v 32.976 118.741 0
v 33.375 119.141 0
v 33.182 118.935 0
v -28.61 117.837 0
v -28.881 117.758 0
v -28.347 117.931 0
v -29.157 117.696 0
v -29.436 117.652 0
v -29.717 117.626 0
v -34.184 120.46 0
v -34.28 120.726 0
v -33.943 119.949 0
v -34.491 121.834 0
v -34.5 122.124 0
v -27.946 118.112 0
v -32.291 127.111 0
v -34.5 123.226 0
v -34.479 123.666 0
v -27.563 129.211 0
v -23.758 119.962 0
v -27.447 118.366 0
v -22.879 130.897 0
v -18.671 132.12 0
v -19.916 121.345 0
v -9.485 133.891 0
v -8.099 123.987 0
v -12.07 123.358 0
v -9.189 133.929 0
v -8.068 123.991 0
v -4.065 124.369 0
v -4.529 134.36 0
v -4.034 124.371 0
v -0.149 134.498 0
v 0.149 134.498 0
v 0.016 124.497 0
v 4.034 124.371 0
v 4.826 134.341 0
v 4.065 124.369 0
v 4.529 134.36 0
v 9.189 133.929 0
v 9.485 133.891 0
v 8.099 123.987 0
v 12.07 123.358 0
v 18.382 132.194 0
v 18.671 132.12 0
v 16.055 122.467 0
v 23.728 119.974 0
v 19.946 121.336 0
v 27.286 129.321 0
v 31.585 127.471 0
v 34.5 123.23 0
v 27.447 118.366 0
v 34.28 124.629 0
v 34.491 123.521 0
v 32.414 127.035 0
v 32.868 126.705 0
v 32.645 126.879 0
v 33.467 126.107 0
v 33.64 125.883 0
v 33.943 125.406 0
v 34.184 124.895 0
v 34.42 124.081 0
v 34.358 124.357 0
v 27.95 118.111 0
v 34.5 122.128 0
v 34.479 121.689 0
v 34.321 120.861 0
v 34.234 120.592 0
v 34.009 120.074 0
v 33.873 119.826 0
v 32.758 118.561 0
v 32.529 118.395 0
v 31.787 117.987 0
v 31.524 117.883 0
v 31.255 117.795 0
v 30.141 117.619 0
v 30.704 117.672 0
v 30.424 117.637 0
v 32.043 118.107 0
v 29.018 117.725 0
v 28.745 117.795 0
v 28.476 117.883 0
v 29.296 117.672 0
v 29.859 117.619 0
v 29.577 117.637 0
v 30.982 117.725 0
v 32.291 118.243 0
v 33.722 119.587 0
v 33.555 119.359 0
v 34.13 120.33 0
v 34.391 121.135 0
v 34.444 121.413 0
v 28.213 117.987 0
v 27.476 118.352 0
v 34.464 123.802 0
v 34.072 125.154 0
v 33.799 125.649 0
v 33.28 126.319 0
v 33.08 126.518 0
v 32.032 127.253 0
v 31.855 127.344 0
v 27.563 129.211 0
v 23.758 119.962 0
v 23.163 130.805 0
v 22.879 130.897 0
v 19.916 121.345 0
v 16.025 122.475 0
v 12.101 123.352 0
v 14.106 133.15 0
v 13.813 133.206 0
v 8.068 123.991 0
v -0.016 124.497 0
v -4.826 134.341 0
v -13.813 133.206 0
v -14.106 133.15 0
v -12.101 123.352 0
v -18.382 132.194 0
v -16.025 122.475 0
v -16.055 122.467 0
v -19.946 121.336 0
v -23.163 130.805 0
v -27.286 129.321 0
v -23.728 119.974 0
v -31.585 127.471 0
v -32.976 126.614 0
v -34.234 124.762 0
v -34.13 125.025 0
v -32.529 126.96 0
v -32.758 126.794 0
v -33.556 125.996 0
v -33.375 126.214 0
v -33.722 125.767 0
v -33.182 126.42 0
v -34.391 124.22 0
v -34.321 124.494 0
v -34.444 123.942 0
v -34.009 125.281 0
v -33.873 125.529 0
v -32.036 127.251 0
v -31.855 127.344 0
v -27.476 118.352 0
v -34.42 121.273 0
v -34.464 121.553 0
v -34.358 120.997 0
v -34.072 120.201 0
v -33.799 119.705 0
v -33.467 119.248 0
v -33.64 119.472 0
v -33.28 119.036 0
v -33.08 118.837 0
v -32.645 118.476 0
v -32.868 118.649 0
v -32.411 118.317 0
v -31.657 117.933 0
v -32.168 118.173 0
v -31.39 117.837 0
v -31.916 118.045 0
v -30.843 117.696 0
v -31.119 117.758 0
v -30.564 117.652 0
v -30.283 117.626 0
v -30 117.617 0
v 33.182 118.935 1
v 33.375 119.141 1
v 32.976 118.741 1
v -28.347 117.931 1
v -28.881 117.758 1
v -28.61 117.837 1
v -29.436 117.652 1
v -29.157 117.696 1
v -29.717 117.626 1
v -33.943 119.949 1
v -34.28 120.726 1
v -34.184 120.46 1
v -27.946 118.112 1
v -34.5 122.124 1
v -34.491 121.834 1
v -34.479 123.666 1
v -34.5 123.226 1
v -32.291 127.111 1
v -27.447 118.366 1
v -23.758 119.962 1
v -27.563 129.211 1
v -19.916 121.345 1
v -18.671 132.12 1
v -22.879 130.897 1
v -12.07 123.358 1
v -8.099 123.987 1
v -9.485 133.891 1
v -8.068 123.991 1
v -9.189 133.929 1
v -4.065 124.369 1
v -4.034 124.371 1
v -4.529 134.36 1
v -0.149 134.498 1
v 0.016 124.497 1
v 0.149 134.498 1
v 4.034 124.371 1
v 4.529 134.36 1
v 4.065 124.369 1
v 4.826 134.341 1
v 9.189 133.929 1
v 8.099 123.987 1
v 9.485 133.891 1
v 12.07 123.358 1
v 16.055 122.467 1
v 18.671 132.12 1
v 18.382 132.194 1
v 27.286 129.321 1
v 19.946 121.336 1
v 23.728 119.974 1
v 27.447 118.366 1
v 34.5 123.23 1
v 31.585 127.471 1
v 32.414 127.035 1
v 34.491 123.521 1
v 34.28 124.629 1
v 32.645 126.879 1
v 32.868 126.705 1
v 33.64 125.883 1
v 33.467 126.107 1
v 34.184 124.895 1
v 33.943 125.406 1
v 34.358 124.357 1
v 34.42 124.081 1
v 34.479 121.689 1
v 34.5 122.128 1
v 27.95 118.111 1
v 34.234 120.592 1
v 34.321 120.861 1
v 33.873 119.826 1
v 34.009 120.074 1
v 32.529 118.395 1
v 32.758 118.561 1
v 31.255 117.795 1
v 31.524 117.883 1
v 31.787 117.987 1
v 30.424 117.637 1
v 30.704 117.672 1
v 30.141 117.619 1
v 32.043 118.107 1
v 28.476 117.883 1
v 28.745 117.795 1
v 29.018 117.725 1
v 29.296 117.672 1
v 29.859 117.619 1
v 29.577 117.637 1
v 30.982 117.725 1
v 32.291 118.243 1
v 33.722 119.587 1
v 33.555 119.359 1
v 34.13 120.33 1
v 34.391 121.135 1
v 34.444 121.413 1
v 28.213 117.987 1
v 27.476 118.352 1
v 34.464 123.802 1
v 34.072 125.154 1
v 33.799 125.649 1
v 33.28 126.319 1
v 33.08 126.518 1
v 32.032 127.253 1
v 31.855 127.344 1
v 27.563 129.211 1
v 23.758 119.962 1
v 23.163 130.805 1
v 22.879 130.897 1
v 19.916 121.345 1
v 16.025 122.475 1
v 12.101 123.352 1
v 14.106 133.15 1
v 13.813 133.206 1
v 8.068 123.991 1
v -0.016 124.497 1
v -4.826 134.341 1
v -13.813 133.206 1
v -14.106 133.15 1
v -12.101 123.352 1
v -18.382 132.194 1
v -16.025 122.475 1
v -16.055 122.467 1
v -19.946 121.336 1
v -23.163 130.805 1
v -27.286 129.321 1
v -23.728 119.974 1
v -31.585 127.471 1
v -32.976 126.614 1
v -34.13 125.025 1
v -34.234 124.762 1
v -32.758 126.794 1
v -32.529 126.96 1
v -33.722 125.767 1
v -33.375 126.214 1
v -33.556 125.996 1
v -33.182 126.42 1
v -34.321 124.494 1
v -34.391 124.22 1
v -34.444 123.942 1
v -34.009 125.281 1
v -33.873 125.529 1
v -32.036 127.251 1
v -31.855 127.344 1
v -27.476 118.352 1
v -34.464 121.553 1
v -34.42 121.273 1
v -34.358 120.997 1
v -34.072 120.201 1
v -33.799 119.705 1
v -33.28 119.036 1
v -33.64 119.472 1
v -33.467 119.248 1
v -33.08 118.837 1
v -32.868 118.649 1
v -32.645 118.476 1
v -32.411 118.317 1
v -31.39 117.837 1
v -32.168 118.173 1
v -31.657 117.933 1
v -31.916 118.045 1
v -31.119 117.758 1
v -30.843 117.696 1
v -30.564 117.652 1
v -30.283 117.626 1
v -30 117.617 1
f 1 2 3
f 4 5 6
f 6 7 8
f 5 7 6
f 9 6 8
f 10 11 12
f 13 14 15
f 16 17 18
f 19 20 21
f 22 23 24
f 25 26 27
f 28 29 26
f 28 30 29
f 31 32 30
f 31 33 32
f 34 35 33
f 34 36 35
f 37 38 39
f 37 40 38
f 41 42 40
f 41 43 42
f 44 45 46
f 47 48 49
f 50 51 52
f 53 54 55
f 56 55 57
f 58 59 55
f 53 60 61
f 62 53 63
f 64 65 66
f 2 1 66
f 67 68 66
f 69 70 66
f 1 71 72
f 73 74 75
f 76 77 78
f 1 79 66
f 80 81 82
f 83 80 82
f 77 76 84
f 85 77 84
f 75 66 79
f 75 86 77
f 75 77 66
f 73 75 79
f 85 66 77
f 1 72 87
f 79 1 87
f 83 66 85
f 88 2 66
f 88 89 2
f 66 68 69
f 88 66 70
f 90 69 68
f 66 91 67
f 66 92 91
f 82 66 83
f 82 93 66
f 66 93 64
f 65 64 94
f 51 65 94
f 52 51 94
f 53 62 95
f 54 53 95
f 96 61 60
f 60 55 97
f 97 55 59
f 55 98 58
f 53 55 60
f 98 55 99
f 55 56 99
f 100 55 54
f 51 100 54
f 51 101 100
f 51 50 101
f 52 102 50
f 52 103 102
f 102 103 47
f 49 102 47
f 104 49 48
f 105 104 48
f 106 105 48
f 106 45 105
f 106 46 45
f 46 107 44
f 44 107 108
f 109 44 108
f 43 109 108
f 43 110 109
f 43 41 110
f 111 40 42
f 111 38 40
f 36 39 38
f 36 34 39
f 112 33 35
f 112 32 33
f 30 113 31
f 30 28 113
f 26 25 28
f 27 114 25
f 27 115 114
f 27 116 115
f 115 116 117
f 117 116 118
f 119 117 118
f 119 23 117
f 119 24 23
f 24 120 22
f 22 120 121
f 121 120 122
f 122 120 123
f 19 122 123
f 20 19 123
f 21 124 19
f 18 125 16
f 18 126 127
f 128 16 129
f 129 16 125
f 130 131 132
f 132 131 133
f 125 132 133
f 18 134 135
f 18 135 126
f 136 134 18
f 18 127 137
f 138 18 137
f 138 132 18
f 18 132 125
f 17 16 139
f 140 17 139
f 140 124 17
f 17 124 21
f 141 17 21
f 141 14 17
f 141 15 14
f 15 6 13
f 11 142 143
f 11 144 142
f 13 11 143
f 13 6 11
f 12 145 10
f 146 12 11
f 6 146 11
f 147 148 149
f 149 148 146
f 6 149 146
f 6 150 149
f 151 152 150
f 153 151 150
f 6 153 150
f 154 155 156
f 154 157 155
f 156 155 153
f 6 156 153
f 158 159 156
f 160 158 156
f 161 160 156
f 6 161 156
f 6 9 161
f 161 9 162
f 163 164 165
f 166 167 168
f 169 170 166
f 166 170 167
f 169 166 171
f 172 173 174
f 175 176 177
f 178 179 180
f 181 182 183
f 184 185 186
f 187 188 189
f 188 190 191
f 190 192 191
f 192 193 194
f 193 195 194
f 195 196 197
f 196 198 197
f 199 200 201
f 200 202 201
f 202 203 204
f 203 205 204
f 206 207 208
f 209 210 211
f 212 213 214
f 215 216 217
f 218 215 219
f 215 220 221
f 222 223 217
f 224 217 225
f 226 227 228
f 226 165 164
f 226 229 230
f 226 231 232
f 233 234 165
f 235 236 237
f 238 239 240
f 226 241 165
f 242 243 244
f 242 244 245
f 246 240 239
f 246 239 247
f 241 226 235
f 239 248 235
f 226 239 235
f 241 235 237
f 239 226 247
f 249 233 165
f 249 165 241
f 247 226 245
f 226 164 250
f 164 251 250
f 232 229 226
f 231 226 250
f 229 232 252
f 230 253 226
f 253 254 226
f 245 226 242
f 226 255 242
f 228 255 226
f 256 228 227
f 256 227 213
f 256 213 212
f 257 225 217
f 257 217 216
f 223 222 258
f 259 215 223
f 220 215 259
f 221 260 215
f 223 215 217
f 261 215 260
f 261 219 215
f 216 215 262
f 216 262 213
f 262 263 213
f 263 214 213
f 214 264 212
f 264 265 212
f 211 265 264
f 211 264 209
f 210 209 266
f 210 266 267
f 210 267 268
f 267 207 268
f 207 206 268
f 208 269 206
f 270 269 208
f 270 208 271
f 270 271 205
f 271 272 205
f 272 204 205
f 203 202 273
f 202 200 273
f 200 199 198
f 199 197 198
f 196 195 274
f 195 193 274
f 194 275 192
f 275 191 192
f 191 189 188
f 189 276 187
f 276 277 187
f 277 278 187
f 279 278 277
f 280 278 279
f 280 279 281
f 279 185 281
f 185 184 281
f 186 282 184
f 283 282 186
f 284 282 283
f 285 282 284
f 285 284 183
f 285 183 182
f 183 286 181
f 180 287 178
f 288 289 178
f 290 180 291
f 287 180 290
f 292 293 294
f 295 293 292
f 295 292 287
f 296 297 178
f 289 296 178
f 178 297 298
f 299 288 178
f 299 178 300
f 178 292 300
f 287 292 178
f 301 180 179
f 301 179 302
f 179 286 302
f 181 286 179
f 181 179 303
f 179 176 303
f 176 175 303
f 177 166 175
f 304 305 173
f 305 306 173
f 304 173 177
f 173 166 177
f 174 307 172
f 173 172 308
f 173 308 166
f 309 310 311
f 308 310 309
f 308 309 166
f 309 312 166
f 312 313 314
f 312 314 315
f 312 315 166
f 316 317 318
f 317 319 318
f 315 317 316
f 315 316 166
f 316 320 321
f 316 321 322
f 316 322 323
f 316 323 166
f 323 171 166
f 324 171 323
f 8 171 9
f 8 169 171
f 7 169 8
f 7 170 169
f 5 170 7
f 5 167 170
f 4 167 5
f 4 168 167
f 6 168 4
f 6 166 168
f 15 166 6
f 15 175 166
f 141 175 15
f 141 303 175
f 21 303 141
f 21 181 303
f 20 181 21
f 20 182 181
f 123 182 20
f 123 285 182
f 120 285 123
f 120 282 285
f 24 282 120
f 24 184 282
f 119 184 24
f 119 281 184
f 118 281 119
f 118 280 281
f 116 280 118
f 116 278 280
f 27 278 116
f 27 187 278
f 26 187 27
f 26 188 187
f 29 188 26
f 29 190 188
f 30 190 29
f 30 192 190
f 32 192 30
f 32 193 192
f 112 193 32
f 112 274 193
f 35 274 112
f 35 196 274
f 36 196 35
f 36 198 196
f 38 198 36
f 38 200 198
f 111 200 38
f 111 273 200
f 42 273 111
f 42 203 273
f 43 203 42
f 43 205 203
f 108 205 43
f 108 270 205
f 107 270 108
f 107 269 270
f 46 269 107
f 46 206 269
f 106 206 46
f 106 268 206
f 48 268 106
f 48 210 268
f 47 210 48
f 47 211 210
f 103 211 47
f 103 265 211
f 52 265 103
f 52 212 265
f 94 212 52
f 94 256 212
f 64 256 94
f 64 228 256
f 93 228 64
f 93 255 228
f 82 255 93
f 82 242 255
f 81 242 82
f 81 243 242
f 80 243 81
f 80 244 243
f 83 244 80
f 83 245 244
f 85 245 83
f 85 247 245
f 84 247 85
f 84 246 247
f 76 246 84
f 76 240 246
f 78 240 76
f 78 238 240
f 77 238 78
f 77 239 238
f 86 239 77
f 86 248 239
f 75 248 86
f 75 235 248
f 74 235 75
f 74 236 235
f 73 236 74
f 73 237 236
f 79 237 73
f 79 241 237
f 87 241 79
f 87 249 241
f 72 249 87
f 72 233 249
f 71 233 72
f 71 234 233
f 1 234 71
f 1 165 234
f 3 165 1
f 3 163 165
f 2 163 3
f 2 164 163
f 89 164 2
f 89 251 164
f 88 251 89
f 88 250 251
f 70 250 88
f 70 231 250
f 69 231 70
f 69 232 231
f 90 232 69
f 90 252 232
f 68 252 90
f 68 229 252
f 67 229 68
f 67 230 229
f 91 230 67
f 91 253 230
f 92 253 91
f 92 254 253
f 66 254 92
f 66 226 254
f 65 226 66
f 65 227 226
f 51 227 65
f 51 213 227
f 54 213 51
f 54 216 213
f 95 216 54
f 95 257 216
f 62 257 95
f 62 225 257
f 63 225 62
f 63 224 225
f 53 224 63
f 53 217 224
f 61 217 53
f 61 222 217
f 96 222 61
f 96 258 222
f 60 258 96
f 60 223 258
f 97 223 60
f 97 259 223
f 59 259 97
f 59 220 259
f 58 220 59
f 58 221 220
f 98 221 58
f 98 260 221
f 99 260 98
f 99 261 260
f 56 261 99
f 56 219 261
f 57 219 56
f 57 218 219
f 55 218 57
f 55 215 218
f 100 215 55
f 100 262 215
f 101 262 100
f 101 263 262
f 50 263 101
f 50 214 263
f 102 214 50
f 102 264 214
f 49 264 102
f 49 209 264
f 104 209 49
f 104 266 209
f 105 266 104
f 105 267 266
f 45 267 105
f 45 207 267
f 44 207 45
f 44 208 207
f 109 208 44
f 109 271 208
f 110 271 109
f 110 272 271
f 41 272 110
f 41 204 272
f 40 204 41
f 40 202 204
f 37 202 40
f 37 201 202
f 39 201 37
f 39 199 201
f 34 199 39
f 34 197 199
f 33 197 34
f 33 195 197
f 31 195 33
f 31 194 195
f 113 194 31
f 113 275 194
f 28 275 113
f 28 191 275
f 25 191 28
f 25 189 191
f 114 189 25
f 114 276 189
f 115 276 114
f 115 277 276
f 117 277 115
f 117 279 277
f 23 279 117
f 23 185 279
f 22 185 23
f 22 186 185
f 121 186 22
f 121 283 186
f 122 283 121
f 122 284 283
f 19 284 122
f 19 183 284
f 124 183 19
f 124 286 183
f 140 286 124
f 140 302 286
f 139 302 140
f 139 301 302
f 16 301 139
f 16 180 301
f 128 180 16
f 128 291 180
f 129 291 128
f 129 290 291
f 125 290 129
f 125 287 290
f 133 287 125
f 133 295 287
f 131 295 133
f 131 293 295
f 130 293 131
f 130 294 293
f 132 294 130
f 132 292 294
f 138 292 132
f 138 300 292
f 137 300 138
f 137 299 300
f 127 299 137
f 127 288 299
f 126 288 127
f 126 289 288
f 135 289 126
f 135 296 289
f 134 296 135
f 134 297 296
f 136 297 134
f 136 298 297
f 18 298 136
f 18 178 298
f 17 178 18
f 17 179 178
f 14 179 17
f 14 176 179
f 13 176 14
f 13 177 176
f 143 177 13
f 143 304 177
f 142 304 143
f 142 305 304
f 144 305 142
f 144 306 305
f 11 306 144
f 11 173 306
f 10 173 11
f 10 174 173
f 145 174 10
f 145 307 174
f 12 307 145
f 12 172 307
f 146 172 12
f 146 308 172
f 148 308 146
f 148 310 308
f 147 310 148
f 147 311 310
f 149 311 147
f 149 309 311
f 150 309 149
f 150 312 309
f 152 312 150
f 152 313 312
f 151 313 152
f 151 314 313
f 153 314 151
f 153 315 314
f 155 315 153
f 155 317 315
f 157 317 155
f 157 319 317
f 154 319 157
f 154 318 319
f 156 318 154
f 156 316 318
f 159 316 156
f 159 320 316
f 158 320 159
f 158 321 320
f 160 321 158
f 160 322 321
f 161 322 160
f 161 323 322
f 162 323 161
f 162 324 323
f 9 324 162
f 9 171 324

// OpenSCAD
$fn=100;


/*
difference(){
linear_extrude(5)
offset(1.2)
whiskers_form();
    
translate([0,0,1.2])
linear_extrude(5)
whiskers_form();
}

translate([0,30,0]){
    linear_extrude(1)
    offset(1.3)
    whiskers_form();
    
    linear_extrude(2)
    offset(-0.2)
    whiskers_form();
    
}
*/

linear_extrude(1)
translate([0,60,0])
offset(-0.5)
whiskers_form();

module whiskers_form() {
    offset(5)
    intersection(){
        translate([-30,0,0])square([60, 100]);
        difference(){
            circle(70);
            circle(69);
        }
    }
}
